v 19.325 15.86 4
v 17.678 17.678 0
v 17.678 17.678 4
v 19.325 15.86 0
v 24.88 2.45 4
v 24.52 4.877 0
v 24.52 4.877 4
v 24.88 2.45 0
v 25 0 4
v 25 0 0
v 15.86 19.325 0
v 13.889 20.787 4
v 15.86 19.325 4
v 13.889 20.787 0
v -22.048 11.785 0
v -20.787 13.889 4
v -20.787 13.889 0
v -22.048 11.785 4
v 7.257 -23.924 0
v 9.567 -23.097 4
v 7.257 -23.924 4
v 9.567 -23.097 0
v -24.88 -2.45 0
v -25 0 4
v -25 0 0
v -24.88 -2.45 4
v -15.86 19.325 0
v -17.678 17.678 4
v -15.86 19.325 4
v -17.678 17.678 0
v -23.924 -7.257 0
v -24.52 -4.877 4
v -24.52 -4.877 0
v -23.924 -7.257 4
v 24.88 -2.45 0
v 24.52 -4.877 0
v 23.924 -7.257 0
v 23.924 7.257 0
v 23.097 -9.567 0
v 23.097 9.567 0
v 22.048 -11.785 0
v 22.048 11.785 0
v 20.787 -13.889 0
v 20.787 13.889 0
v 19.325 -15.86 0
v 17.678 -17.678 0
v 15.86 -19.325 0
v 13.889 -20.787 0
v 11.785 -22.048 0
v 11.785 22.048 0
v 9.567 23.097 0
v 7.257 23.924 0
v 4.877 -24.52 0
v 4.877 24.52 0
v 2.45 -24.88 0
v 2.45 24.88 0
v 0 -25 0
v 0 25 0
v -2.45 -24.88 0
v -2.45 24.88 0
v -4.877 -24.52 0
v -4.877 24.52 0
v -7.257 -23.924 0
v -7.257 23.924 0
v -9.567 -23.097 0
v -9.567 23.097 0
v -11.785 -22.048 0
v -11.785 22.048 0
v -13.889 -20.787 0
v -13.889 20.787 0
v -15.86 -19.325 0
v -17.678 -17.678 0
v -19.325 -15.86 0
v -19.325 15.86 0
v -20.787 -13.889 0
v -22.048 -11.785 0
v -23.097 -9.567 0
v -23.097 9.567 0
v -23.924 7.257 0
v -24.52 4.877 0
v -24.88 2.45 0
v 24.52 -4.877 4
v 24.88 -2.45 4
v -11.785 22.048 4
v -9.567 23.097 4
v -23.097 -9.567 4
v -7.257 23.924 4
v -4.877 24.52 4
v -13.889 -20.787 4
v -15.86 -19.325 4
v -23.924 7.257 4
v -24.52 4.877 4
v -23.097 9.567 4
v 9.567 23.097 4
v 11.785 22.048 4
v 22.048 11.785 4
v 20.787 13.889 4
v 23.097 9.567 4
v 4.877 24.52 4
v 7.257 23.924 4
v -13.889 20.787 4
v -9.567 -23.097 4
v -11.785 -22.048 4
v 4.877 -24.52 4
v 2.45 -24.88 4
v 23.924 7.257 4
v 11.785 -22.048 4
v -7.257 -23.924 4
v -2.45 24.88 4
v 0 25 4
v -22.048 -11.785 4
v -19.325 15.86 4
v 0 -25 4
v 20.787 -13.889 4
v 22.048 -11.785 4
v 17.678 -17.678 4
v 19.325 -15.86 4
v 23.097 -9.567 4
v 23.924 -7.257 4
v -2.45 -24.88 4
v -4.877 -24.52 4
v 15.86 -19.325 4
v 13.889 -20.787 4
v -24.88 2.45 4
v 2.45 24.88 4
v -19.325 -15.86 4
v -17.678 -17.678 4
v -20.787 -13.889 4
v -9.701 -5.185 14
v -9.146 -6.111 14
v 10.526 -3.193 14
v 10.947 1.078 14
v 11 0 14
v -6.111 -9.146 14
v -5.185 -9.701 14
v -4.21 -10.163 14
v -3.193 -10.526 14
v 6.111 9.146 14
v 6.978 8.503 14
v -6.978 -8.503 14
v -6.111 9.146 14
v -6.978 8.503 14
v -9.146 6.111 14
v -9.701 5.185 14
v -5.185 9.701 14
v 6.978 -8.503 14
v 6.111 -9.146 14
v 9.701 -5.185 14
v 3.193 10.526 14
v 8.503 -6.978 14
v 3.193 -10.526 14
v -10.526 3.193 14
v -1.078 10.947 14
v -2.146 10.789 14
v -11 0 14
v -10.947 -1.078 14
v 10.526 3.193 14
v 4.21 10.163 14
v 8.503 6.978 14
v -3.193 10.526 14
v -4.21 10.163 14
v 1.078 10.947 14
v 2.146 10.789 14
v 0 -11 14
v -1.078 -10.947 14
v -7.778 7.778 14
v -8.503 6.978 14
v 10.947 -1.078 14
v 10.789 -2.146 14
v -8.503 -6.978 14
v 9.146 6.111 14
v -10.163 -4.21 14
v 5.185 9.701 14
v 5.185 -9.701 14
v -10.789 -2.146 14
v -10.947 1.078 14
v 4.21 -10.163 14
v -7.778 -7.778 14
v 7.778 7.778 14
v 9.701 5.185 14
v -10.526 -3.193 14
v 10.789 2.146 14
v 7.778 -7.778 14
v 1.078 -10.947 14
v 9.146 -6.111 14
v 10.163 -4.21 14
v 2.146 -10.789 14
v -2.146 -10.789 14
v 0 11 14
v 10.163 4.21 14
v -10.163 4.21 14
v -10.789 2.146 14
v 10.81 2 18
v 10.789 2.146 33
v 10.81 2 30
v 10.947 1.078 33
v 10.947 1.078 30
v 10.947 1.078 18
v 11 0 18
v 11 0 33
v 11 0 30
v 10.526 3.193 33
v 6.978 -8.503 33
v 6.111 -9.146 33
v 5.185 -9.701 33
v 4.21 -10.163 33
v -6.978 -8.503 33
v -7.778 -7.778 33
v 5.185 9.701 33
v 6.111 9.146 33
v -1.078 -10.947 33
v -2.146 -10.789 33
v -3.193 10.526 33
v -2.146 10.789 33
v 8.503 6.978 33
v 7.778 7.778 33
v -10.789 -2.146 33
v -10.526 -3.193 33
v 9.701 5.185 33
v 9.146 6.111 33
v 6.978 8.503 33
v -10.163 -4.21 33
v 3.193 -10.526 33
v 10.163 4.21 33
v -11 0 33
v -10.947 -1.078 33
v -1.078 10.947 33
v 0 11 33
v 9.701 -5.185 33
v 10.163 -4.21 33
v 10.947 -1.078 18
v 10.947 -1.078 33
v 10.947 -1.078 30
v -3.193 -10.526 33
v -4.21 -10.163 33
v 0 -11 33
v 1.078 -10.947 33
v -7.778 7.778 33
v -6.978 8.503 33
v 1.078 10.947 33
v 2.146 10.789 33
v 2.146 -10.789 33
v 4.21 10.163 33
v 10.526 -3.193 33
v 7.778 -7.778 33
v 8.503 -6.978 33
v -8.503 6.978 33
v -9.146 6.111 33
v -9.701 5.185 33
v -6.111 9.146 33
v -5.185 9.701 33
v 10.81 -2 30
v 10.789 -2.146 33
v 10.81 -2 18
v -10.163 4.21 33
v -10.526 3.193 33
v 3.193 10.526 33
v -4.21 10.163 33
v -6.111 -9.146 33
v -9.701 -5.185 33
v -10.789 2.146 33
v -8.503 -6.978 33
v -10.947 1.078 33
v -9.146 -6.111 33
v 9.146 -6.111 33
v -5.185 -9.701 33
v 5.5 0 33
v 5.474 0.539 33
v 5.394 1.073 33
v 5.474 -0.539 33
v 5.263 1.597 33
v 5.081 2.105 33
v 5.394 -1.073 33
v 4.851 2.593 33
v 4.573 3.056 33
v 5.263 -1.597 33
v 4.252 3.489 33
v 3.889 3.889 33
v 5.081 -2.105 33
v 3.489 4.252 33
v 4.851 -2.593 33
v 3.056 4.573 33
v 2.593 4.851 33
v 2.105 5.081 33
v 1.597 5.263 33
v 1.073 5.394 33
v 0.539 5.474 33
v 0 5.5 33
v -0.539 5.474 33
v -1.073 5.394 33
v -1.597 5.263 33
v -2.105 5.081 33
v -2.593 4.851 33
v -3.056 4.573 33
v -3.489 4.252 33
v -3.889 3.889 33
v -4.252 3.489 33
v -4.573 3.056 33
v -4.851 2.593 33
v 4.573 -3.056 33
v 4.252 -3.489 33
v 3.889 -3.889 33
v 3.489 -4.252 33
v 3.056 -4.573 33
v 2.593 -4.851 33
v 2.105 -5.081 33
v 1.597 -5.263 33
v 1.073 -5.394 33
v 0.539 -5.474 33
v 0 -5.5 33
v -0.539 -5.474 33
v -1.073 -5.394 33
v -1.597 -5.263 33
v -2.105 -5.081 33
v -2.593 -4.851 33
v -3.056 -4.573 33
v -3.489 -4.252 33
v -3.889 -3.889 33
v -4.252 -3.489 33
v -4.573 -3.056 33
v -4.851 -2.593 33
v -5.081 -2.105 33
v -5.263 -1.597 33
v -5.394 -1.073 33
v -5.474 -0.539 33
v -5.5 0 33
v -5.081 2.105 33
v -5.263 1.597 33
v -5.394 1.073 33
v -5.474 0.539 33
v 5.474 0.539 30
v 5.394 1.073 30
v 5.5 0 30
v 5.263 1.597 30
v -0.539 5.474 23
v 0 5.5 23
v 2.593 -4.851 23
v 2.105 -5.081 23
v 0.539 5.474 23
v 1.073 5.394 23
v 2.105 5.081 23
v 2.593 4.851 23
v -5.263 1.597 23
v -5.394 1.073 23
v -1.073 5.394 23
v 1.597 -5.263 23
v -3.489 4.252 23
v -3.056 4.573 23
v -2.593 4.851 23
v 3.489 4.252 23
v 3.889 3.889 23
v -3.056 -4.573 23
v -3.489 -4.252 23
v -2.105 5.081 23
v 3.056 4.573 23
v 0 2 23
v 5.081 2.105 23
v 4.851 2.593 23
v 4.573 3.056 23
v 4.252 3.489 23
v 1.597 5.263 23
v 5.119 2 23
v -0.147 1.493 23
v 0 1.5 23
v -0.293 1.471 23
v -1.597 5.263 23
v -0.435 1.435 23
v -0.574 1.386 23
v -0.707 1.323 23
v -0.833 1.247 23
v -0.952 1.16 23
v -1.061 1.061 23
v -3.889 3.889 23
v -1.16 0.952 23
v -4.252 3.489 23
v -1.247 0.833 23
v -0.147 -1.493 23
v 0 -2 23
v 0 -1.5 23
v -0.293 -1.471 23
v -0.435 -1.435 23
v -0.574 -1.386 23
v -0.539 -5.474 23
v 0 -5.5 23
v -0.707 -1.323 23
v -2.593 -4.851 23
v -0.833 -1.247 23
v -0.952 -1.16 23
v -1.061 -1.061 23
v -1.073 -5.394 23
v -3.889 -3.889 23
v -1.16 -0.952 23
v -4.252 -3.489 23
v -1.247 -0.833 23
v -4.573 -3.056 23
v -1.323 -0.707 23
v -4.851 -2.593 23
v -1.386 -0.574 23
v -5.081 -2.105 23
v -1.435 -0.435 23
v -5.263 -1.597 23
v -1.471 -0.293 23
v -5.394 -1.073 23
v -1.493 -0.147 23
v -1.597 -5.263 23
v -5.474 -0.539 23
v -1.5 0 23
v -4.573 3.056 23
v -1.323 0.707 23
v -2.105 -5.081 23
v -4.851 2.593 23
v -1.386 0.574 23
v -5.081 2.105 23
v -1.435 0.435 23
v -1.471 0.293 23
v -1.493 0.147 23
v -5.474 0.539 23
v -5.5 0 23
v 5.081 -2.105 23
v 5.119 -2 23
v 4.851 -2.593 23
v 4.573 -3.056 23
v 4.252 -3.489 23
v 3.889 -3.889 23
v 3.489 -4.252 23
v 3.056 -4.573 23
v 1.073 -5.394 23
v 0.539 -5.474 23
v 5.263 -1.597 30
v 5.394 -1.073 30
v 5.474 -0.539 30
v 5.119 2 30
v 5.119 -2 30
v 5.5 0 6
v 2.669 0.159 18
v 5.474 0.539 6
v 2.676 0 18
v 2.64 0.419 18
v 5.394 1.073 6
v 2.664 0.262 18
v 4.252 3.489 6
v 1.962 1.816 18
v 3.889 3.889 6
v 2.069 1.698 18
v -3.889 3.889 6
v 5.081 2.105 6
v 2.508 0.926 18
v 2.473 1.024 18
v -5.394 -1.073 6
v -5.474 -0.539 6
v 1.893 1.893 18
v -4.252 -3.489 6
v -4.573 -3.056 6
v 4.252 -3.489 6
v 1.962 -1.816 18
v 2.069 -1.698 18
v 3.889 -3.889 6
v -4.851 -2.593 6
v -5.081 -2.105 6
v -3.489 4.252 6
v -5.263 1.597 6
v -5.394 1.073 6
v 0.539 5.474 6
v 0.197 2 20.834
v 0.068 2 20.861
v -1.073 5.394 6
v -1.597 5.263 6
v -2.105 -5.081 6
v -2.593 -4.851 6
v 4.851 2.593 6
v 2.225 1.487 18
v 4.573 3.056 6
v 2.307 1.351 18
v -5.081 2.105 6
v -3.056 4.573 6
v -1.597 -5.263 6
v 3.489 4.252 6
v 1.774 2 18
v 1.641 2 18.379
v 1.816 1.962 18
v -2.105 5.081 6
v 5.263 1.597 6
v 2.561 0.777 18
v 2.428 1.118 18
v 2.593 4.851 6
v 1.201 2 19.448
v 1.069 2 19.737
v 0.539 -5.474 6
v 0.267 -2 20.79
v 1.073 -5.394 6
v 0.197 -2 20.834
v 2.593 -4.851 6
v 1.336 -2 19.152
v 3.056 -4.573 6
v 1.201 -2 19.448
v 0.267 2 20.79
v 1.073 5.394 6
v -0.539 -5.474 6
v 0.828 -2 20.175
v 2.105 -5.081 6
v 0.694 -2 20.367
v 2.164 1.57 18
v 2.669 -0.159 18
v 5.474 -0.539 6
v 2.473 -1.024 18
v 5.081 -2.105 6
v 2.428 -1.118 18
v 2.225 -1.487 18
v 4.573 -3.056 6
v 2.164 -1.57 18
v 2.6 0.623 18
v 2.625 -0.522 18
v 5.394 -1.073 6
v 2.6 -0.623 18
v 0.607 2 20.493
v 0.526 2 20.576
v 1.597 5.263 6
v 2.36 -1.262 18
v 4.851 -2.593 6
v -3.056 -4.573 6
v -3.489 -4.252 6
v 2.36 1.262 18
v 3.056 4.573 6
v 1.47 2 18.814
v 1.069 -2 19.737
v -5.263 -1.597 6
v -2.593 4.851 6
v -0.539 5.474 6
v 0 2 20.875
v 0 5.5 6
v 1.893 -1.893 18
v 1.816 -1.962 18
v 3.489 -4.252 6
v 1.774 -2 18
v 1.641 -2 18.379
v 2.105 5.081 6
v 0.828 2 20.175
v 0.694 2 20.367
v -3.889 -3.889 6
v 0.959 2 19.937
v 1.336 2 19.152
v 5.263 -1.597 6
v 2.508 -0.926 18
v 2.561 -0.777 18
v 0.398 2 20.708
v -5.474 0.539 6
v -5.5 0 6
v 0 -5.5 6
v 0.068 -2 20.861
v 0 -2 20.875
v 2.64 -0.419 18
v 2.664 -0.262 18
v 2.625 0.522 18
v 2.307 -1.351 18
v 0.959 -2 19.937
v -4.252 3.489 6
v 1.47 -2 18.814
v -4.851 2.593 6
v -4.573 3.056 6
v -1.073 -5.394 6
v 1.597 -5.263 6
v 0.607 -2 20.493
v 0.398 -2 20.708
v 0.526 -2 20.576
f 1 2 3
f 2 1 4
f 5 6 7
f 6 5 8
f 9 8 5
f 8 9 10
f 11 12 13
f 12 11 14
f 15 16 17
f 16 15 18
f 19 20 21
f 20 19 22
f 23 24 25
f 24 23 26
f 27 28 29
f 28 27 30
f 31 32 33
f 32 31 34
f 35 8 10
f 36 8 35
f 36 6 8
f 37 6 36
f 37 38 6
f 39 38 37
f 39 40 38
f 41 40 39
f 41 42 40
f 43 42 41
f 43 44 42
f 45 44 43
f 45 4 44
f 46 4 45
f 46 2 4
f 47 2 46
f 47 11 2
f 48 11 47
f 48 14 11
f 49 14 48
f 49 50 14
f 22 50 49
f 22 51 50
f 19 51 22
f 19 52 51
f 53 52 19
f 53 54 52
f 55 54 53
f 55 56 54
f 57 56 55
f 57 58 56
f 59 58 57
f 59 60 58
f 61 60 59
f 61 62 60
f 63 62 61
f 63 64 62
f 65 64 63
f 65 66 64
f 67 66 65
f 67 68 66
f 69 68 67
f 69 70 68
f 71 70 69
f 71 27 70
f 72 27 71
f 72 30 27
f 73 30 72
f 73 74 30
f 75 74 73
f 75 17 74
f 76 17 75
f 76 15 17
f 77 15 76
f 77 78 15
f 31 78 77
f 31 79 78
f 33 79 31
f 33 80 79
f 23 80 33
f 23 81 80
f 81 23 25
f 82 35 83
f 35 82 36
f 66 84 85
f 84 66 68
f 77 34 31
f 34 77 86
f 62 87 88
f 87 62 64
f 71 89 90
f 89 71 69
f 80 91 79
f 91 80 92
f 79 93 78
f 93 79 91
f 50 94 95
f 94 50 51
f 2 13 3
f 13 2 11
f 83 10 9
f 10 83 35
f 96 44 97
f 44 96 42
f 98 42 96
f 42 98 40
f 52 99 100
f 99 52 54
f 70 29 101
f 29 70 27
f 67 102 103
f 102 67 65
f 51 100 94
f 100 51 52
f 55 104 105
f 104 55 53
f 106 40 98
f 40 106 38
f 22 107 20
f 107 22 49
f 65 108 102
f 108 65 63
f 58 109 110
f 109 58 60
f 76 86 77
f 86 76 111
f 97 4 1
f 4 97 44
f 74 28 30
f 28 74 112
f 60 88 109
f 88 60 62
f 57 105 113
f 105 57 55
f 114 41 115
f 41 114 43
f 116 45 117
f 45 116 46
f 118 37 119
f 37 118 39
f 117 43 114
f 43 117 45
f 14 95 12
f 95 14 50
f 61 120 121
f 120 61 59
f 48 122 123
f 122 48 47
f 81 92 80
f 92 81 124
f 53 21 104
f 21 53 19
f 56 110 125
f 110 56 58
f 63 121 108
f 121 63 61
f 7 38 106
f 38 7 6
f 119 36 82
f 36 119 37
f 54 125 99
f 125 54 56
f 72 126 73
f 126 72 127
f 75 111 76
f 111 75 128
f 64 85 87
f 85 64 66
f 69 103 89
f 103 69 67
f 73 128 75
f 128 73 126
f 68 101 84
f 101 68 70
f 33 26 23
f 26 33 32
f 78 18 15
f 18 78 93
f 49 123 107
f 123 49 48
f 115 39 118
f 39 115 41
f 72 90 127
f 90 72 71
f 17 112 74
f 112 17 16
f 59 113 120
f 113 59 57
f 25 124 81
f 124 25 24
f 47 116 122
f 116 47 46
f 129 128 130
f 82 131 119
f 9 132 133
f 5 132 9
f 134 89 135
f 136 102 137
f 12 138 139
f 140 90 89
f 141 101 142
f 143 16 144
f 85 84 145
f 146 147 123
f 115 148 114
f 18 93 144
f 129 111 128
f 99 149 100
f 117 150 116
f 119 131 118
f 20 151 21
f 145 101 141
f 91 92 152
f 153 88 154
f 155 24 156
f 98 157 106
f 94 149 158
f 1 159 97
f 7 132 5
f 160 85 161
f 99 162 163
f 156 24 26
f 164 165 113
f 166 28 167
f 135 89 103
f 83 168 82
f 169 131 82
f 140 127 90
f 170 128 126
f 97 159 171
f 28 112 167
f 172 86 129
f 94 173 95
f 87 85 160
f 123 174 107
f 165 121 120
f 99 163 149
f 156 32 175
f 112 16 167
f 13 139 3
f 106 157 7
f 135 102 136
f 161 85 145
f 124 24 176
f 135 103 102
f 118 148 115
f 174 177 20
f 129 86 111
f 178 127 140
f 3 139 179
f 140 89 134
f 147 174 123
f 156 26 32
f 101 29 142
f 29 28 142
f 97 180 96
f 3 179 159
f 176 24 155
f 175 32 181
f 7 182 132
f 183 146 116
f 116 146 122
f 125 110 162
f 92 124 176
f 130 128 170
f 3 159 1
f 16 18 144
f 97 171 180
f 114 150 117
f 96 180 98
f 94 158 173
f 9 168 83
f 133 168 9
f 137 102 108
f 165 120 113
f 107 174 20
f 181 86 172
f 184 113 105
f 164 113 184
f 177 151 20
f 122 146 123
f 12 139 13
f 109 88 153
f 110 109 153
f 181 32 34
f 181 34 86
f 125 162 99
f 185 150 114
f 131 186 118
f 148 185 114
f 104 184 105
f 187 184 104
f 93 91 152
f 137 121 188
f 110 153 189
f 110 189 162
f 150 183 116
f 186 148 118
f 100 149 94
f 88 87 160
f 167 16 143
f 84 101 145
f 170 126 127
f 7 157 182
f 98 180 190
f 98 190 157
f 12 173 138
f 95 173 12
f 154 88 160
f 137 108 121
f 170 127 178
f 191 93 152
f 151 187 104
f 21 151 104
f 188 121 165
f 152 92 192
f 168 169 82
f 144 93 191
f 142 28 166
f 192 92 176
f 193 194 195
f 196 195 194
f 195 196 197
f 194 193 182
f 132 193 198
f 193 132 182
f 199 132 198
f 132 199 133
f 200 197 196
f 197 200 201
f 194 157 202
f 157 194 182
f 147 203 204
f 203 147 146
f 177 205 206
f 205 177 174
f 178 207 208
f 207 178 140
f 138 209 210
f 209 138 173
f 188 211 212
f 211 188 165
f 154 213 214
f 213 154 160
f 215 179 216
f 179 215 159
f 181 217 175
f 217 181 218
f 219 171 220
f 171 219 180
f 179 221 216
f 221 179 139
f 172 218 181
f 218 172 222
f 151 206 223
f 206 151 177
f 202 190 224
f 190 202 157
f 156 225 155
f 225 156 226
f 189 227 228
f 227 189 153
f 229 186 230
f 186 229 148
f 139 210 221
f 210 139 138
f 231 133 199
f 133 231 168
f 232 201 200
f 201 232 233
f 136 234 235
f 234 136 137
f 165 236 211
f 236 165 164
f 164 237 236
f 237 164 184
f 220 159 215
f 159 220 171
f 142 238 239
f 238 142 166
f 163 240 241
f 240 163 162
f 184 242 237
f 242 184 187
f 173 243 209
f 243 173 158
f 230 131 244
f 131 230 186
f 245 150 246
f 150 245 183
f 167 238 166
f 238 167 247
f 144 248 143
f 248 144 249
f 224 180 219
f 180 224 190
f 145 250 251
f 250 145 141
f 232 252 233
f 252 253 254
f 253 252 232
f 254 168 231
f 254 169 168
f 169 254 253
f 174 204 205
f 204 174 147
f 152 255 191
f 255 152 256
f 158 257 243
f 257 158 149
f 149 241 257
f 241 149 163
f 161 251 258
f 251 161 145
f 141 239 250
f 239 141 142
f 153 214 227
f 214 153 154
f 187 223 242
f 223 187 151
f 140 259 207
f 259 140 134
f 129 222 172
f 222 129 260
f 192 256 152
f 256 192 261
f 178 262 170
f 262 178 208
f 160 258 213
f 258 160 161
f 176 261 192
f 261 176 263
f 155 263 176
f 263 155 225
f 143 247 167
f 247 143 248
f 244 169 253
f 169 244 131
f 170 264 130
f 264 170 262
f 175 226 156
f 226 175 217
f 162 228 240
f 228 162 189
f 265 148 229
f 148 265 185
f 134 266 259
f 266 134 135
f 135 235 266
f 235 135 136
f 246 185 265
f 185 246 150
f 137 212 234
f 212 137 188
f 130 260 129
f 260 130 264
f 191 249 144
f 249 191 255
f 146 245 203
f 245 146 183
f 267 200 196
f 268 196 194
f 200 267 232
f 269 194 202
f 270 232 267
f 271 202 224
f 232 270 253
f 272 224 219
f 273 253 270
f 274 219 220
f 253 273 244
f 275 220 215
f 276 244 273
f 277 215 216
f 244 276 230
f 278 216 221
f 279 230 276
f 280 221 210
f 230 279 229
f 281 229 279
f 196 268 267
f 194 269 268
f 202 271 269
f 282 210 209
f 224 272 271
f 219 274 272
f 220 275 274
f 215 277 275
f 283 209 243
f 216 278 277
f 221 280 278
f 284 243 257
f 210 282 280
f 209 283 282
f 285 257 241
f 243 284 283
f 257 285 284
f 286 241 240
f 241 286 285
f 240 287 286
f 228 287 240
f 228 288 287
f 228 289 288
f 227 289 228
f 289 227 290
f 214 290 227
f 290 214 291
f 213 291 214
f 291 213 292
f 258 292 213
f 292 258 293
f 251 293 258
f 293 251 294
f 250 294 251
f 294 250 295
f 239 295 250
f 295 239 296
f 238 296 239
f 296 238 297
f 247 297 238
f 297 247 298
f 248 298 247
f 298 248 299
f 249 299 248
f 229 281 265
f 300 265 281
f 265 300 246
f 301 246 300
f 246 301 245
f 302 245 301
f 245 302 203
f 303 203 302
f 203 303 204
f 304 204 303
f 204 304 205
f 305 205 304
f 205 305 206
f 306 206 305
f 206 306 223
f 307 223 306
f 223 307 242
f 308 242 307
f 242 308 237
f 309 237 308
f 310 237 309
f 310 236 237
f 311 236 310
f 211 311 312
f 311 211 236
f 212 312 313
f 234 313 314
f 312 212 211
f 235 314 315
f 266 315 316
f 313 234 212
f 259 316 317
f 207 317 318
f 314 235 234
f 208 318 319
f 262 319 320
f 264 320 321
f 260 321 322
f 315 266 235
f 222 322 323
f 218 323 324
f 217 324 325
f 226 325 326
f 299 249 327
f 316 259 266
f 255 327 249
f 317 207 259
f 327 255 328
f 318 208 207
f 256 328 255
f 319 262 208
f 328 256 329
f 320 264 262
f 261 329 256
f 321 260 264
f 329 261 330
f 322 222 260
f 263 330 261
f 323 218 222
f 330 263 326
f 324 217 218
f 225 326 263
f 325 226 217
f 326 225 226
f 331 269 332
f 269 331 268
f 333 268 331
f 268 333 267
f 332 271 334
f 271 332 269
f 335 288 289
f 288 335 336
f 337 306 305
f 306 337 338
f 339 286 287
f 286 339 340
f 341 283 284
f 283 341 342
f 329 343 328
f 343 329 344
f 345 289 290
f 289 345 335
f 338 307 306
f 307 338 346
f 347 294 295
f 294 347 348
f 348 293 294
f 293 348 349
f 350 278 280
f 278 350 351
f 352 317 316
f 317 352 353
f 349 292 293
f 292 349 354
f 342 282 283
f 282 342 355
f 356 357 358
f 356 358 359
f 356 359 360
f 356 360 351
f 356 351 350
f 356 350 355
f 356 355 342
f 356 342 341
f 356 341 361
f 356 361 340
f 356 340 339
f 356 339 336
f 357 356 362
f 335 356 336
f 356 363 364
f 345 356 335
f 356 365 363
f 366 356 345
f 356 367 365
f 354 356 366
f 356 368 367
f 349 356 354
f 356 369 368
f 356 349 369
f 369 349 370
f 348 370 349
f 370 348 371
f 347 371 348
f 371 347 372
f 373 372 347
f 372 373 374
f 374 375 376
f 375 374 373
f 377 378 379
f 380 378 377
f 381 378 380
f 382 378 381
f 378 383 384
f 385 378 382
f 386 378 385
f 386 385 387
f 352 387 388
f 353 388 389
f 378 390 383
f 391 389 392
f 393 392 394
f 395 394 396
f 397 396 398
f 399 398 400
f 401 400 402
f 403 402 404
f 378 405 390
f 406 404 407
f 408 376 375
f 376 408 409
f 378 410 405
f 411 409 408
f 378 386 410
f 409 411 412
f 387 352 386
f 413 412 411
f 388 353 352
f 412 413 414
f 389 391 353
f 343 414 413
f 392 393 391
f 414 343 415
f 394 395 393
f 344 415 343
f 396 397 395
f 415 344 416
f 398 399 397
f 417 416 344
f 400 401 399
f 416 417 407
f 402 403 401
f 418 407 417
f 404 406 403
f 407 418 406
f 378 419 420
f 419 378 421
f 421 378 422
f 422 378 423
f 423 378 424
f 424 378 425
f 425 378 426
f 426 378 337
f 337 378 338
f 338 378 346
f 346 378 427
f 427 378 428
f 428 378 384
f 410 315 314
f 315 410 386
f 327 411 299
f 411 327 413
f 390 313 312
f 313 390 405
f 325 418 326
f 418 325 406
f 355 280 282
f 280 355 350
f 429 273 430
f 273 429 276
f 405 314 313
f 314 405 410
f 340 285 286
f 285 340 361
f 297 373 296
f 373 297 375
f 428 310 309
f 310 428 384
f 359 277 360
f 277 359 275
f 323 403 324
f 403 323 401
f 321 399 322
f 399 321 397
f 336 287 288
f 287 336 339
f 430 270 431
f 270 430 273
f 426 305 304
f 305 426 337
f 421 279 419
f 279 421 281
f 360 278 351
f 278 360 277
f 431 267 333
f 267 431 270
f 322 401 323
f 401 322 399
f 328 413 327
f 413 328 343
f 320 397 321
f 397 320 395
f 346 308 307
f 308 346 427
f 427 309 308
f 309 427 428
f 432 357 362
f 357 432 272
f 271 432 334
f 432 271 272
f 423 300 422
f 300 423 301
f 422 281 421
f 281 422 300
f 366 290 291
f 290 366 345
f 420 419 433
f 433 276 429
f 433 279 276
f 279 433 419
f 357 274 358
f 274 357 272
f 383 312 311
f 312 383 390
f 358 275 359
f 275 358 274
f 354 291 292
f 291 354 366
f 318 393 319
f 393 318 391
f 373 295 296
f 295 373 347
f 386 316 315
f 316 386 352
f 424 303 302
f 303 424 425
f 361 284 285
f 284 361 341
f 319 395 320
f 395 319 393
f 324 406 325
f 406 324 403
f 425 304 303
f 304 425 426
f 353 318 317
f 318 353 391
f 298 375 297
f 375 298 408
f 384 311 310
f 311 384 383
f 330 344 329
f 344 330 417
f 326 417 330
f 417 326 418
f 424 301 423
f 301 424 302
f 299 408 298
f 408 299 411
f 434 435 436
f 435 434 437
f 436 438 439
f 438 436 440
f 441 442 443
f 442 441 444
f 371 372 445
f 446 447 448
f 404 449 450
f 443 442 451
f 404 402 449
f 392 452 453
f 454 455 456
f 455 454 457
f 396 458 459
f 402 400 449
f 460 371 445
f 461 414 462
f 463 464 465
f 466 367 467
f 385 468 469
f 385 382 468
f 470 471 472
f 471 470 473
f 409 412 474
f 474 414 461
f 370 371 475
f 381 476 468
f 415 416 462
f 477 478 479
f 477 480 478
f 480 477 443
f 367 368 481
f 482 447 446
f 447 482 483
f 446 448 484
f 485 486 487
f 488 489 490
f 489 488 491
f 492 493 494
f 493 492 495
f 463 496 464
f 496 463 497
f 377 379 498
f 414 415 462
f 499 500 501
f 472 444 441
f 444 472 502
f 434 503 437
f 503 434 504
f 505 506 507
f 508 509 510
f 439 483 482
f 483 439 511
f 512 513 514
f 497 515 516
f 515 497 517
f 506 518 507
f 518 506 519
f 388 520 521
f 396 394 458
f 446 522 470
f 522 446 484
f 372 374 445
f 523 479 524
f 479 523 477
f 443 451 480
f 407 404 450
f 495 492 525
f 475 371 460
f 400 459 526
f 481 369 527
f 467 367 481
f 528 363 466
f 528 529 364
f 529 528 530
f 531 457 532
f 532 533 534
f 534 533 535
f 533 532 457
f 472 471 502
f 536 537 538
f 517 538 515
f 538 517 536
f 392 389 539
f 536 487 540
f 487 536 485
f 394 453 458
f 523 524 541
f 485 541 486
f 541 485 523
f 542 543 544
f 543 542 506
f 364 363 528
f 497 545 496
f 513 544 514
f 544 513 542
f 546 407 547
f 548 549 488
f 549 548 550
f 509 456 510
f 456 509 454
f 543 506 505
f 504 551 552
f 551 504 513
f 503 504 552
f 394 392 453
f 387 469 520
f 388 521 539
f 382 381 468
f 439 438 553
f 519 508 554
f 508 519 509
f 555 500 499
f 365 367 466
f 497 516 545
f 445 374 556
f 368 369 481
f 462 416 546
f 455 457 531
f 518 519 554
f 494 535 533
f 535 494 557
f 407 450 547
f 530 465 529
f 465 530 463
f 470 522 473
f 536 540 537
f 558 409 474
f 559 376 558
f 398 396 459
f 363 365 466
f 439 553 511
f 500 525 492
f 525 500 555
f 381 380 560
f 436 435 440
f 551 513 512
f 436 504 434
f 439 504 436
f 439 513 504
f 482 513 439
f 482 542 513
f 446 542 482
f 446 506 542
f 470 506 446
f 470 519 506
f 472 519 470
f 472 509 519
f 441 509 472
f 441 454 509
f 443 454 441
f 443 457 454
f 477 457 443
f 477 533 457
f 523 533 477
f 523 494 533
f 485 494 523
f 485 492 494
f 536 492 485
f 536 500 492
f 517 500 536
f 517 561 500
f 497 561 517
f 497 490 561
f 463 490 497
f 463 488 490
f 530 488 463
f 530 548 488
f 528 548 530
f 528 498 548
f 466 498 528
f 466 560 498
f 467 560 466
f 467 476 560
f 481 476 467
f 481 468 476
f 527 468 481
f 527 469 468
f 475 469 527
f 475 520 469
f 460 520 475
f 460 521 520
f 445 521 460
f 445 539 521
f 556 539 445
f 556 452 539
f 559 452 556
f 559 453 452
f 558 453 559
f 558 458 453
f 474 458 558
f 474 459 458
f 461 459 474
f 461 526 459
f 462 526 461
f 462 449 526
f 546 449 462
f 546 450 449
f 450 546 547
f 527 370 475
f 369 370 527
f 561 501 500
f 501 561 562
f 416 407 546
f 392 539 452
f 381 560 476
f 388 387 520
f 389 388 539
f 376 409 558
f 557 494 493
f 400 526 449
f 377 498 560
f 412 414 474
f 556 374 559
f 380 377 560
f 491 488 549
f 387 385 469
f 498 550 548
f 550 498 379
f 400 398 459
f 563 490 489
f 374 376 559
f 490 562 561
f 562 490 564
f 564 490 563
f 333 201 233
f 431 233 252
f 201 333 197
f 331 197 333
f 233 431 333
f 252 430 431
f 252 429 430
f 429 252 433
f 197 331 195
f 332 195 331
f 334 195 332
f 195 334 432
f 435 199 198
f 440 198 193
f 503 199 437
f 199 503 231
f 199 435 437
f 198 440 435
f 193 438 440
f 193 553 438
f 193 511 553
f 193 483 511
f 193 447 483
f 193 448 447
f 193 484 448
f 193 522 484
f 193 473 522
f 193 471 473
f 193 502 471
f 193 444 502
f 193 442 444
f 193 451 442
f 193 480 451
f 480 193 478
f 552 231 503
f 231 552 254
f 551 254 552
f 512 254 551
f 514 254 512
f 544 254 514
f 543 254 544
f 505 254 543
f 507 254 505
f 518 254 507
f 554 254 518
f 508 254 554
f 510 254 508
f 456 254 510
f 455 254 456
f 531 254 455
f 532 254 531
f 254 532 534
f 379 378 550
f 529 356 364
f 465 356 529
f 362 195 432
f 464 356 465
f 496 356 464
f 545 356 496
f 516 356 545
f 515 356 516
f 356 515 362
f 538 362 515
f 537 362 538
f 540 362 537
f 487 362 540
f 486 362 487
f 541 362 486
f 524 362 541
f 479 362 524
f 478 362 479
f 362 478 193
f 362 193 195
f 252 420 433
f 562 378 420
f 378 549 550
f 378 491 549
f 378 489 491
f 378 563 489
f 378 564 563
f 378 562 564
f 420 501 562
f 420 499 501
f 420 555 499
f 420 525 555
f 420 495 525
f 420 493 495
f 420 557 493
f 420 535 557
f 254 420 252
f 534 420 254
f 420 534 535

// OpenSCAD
// 1.5 mL microcentrifuge tube stand for an analytical balance
// Printed standing up: rests on XY plane at z = 0, builds upward (+Z), centred on origin.

$fn = 64;

// ---- Base disc (z = 0 to 4) ----
base_d   = 50;   // base disc diameter
base_h   = 4;    // base disc height

// ---- Cone (z = 4 to 14) ----
cone_top_d = 22; // cone top diameter
cone_bot_d = 50; // cone bottom diameter
cone_h     = 10; // cone height (14 - 4)

// ---- Column (z = 14 to 33) ----
col_d  = 22;     // column diameter
col_h  = 19;     // column height (33 - 14)

// ---- Tube seat (cut from top down the axis) ----
seat_d      = 11; // seat bore diameter (z = 33 down to 23)
seat_cyl_h  = 10; // straight seat height (33 - 23)
seat_cone_d = 3;  // seat cone tip diameter at z = 6
seat_cone_h = 17; // seat cone height (23 - 6)

// ---- Viewing window (cut through +X wall) ----
win_w  = 4;  // window width in Y
win_z0 = 18; // window bottom z
win_z1 = 30; // window top z

// ---- Build the solid stand ----
module stand() { union() {
    // Base disc
    translate([0, 0, 0])
        cylinder(h = base_h, d = base_d, $fn = $fn);

    // Cone from 50 mm at z = 4 to 22 mm at z = 14
    translate([0, 0, base_h])
        cylinder(h = cone_h, d1 = cone_bot_d, d2 = cone_top_d, $fn = $fn);

    // Column from z = 14 to 33
    translate([0, 0, base_h + cone_h])
        cylinder(h = col_h, d = col_d, $fn = $fn);
} }

// ---- Tube seat cutter (extends 1 mm above the top so the cut is clean) ----
module seat_cutter() { union() {
    // Straight bore: z = 33 down to 23
    translate([0, 0, 23])
        cylinder(h = seat_cyl_h, d = seat_d, $fn = $fn);

    // Cone following the tube tip: 11 mm at z = 23 down to 3 mm at z = 6
    translate([0, 0, 6])
        cylinder(h = seat_cone_h, d1 = seat_d, d2 = seat_cone_d, $fn = $fn);

    // 1 mm extension above the top face so the bore is fully open
    translate([0, 0, 33])
        cylinder(h = 1, d = seat_d, $fn = $fn);
} }

// ---- Viewing window cutter (straight through the +X wall) ----
// A box that starts inside the bore (x = 0) and extends past the outer wall (x = 12),
// so it cuts a clean slot through the column wall on the +X side.
module window_cutter() { translate([0, -win_w / 2, win_z0])
    cube([12, win_w, win_z1 - win_z0]); }

// ---- Final part: stand minus seat and window ----
difference() {
    stand();
    seat_cutter();
    window_cutter();
}
